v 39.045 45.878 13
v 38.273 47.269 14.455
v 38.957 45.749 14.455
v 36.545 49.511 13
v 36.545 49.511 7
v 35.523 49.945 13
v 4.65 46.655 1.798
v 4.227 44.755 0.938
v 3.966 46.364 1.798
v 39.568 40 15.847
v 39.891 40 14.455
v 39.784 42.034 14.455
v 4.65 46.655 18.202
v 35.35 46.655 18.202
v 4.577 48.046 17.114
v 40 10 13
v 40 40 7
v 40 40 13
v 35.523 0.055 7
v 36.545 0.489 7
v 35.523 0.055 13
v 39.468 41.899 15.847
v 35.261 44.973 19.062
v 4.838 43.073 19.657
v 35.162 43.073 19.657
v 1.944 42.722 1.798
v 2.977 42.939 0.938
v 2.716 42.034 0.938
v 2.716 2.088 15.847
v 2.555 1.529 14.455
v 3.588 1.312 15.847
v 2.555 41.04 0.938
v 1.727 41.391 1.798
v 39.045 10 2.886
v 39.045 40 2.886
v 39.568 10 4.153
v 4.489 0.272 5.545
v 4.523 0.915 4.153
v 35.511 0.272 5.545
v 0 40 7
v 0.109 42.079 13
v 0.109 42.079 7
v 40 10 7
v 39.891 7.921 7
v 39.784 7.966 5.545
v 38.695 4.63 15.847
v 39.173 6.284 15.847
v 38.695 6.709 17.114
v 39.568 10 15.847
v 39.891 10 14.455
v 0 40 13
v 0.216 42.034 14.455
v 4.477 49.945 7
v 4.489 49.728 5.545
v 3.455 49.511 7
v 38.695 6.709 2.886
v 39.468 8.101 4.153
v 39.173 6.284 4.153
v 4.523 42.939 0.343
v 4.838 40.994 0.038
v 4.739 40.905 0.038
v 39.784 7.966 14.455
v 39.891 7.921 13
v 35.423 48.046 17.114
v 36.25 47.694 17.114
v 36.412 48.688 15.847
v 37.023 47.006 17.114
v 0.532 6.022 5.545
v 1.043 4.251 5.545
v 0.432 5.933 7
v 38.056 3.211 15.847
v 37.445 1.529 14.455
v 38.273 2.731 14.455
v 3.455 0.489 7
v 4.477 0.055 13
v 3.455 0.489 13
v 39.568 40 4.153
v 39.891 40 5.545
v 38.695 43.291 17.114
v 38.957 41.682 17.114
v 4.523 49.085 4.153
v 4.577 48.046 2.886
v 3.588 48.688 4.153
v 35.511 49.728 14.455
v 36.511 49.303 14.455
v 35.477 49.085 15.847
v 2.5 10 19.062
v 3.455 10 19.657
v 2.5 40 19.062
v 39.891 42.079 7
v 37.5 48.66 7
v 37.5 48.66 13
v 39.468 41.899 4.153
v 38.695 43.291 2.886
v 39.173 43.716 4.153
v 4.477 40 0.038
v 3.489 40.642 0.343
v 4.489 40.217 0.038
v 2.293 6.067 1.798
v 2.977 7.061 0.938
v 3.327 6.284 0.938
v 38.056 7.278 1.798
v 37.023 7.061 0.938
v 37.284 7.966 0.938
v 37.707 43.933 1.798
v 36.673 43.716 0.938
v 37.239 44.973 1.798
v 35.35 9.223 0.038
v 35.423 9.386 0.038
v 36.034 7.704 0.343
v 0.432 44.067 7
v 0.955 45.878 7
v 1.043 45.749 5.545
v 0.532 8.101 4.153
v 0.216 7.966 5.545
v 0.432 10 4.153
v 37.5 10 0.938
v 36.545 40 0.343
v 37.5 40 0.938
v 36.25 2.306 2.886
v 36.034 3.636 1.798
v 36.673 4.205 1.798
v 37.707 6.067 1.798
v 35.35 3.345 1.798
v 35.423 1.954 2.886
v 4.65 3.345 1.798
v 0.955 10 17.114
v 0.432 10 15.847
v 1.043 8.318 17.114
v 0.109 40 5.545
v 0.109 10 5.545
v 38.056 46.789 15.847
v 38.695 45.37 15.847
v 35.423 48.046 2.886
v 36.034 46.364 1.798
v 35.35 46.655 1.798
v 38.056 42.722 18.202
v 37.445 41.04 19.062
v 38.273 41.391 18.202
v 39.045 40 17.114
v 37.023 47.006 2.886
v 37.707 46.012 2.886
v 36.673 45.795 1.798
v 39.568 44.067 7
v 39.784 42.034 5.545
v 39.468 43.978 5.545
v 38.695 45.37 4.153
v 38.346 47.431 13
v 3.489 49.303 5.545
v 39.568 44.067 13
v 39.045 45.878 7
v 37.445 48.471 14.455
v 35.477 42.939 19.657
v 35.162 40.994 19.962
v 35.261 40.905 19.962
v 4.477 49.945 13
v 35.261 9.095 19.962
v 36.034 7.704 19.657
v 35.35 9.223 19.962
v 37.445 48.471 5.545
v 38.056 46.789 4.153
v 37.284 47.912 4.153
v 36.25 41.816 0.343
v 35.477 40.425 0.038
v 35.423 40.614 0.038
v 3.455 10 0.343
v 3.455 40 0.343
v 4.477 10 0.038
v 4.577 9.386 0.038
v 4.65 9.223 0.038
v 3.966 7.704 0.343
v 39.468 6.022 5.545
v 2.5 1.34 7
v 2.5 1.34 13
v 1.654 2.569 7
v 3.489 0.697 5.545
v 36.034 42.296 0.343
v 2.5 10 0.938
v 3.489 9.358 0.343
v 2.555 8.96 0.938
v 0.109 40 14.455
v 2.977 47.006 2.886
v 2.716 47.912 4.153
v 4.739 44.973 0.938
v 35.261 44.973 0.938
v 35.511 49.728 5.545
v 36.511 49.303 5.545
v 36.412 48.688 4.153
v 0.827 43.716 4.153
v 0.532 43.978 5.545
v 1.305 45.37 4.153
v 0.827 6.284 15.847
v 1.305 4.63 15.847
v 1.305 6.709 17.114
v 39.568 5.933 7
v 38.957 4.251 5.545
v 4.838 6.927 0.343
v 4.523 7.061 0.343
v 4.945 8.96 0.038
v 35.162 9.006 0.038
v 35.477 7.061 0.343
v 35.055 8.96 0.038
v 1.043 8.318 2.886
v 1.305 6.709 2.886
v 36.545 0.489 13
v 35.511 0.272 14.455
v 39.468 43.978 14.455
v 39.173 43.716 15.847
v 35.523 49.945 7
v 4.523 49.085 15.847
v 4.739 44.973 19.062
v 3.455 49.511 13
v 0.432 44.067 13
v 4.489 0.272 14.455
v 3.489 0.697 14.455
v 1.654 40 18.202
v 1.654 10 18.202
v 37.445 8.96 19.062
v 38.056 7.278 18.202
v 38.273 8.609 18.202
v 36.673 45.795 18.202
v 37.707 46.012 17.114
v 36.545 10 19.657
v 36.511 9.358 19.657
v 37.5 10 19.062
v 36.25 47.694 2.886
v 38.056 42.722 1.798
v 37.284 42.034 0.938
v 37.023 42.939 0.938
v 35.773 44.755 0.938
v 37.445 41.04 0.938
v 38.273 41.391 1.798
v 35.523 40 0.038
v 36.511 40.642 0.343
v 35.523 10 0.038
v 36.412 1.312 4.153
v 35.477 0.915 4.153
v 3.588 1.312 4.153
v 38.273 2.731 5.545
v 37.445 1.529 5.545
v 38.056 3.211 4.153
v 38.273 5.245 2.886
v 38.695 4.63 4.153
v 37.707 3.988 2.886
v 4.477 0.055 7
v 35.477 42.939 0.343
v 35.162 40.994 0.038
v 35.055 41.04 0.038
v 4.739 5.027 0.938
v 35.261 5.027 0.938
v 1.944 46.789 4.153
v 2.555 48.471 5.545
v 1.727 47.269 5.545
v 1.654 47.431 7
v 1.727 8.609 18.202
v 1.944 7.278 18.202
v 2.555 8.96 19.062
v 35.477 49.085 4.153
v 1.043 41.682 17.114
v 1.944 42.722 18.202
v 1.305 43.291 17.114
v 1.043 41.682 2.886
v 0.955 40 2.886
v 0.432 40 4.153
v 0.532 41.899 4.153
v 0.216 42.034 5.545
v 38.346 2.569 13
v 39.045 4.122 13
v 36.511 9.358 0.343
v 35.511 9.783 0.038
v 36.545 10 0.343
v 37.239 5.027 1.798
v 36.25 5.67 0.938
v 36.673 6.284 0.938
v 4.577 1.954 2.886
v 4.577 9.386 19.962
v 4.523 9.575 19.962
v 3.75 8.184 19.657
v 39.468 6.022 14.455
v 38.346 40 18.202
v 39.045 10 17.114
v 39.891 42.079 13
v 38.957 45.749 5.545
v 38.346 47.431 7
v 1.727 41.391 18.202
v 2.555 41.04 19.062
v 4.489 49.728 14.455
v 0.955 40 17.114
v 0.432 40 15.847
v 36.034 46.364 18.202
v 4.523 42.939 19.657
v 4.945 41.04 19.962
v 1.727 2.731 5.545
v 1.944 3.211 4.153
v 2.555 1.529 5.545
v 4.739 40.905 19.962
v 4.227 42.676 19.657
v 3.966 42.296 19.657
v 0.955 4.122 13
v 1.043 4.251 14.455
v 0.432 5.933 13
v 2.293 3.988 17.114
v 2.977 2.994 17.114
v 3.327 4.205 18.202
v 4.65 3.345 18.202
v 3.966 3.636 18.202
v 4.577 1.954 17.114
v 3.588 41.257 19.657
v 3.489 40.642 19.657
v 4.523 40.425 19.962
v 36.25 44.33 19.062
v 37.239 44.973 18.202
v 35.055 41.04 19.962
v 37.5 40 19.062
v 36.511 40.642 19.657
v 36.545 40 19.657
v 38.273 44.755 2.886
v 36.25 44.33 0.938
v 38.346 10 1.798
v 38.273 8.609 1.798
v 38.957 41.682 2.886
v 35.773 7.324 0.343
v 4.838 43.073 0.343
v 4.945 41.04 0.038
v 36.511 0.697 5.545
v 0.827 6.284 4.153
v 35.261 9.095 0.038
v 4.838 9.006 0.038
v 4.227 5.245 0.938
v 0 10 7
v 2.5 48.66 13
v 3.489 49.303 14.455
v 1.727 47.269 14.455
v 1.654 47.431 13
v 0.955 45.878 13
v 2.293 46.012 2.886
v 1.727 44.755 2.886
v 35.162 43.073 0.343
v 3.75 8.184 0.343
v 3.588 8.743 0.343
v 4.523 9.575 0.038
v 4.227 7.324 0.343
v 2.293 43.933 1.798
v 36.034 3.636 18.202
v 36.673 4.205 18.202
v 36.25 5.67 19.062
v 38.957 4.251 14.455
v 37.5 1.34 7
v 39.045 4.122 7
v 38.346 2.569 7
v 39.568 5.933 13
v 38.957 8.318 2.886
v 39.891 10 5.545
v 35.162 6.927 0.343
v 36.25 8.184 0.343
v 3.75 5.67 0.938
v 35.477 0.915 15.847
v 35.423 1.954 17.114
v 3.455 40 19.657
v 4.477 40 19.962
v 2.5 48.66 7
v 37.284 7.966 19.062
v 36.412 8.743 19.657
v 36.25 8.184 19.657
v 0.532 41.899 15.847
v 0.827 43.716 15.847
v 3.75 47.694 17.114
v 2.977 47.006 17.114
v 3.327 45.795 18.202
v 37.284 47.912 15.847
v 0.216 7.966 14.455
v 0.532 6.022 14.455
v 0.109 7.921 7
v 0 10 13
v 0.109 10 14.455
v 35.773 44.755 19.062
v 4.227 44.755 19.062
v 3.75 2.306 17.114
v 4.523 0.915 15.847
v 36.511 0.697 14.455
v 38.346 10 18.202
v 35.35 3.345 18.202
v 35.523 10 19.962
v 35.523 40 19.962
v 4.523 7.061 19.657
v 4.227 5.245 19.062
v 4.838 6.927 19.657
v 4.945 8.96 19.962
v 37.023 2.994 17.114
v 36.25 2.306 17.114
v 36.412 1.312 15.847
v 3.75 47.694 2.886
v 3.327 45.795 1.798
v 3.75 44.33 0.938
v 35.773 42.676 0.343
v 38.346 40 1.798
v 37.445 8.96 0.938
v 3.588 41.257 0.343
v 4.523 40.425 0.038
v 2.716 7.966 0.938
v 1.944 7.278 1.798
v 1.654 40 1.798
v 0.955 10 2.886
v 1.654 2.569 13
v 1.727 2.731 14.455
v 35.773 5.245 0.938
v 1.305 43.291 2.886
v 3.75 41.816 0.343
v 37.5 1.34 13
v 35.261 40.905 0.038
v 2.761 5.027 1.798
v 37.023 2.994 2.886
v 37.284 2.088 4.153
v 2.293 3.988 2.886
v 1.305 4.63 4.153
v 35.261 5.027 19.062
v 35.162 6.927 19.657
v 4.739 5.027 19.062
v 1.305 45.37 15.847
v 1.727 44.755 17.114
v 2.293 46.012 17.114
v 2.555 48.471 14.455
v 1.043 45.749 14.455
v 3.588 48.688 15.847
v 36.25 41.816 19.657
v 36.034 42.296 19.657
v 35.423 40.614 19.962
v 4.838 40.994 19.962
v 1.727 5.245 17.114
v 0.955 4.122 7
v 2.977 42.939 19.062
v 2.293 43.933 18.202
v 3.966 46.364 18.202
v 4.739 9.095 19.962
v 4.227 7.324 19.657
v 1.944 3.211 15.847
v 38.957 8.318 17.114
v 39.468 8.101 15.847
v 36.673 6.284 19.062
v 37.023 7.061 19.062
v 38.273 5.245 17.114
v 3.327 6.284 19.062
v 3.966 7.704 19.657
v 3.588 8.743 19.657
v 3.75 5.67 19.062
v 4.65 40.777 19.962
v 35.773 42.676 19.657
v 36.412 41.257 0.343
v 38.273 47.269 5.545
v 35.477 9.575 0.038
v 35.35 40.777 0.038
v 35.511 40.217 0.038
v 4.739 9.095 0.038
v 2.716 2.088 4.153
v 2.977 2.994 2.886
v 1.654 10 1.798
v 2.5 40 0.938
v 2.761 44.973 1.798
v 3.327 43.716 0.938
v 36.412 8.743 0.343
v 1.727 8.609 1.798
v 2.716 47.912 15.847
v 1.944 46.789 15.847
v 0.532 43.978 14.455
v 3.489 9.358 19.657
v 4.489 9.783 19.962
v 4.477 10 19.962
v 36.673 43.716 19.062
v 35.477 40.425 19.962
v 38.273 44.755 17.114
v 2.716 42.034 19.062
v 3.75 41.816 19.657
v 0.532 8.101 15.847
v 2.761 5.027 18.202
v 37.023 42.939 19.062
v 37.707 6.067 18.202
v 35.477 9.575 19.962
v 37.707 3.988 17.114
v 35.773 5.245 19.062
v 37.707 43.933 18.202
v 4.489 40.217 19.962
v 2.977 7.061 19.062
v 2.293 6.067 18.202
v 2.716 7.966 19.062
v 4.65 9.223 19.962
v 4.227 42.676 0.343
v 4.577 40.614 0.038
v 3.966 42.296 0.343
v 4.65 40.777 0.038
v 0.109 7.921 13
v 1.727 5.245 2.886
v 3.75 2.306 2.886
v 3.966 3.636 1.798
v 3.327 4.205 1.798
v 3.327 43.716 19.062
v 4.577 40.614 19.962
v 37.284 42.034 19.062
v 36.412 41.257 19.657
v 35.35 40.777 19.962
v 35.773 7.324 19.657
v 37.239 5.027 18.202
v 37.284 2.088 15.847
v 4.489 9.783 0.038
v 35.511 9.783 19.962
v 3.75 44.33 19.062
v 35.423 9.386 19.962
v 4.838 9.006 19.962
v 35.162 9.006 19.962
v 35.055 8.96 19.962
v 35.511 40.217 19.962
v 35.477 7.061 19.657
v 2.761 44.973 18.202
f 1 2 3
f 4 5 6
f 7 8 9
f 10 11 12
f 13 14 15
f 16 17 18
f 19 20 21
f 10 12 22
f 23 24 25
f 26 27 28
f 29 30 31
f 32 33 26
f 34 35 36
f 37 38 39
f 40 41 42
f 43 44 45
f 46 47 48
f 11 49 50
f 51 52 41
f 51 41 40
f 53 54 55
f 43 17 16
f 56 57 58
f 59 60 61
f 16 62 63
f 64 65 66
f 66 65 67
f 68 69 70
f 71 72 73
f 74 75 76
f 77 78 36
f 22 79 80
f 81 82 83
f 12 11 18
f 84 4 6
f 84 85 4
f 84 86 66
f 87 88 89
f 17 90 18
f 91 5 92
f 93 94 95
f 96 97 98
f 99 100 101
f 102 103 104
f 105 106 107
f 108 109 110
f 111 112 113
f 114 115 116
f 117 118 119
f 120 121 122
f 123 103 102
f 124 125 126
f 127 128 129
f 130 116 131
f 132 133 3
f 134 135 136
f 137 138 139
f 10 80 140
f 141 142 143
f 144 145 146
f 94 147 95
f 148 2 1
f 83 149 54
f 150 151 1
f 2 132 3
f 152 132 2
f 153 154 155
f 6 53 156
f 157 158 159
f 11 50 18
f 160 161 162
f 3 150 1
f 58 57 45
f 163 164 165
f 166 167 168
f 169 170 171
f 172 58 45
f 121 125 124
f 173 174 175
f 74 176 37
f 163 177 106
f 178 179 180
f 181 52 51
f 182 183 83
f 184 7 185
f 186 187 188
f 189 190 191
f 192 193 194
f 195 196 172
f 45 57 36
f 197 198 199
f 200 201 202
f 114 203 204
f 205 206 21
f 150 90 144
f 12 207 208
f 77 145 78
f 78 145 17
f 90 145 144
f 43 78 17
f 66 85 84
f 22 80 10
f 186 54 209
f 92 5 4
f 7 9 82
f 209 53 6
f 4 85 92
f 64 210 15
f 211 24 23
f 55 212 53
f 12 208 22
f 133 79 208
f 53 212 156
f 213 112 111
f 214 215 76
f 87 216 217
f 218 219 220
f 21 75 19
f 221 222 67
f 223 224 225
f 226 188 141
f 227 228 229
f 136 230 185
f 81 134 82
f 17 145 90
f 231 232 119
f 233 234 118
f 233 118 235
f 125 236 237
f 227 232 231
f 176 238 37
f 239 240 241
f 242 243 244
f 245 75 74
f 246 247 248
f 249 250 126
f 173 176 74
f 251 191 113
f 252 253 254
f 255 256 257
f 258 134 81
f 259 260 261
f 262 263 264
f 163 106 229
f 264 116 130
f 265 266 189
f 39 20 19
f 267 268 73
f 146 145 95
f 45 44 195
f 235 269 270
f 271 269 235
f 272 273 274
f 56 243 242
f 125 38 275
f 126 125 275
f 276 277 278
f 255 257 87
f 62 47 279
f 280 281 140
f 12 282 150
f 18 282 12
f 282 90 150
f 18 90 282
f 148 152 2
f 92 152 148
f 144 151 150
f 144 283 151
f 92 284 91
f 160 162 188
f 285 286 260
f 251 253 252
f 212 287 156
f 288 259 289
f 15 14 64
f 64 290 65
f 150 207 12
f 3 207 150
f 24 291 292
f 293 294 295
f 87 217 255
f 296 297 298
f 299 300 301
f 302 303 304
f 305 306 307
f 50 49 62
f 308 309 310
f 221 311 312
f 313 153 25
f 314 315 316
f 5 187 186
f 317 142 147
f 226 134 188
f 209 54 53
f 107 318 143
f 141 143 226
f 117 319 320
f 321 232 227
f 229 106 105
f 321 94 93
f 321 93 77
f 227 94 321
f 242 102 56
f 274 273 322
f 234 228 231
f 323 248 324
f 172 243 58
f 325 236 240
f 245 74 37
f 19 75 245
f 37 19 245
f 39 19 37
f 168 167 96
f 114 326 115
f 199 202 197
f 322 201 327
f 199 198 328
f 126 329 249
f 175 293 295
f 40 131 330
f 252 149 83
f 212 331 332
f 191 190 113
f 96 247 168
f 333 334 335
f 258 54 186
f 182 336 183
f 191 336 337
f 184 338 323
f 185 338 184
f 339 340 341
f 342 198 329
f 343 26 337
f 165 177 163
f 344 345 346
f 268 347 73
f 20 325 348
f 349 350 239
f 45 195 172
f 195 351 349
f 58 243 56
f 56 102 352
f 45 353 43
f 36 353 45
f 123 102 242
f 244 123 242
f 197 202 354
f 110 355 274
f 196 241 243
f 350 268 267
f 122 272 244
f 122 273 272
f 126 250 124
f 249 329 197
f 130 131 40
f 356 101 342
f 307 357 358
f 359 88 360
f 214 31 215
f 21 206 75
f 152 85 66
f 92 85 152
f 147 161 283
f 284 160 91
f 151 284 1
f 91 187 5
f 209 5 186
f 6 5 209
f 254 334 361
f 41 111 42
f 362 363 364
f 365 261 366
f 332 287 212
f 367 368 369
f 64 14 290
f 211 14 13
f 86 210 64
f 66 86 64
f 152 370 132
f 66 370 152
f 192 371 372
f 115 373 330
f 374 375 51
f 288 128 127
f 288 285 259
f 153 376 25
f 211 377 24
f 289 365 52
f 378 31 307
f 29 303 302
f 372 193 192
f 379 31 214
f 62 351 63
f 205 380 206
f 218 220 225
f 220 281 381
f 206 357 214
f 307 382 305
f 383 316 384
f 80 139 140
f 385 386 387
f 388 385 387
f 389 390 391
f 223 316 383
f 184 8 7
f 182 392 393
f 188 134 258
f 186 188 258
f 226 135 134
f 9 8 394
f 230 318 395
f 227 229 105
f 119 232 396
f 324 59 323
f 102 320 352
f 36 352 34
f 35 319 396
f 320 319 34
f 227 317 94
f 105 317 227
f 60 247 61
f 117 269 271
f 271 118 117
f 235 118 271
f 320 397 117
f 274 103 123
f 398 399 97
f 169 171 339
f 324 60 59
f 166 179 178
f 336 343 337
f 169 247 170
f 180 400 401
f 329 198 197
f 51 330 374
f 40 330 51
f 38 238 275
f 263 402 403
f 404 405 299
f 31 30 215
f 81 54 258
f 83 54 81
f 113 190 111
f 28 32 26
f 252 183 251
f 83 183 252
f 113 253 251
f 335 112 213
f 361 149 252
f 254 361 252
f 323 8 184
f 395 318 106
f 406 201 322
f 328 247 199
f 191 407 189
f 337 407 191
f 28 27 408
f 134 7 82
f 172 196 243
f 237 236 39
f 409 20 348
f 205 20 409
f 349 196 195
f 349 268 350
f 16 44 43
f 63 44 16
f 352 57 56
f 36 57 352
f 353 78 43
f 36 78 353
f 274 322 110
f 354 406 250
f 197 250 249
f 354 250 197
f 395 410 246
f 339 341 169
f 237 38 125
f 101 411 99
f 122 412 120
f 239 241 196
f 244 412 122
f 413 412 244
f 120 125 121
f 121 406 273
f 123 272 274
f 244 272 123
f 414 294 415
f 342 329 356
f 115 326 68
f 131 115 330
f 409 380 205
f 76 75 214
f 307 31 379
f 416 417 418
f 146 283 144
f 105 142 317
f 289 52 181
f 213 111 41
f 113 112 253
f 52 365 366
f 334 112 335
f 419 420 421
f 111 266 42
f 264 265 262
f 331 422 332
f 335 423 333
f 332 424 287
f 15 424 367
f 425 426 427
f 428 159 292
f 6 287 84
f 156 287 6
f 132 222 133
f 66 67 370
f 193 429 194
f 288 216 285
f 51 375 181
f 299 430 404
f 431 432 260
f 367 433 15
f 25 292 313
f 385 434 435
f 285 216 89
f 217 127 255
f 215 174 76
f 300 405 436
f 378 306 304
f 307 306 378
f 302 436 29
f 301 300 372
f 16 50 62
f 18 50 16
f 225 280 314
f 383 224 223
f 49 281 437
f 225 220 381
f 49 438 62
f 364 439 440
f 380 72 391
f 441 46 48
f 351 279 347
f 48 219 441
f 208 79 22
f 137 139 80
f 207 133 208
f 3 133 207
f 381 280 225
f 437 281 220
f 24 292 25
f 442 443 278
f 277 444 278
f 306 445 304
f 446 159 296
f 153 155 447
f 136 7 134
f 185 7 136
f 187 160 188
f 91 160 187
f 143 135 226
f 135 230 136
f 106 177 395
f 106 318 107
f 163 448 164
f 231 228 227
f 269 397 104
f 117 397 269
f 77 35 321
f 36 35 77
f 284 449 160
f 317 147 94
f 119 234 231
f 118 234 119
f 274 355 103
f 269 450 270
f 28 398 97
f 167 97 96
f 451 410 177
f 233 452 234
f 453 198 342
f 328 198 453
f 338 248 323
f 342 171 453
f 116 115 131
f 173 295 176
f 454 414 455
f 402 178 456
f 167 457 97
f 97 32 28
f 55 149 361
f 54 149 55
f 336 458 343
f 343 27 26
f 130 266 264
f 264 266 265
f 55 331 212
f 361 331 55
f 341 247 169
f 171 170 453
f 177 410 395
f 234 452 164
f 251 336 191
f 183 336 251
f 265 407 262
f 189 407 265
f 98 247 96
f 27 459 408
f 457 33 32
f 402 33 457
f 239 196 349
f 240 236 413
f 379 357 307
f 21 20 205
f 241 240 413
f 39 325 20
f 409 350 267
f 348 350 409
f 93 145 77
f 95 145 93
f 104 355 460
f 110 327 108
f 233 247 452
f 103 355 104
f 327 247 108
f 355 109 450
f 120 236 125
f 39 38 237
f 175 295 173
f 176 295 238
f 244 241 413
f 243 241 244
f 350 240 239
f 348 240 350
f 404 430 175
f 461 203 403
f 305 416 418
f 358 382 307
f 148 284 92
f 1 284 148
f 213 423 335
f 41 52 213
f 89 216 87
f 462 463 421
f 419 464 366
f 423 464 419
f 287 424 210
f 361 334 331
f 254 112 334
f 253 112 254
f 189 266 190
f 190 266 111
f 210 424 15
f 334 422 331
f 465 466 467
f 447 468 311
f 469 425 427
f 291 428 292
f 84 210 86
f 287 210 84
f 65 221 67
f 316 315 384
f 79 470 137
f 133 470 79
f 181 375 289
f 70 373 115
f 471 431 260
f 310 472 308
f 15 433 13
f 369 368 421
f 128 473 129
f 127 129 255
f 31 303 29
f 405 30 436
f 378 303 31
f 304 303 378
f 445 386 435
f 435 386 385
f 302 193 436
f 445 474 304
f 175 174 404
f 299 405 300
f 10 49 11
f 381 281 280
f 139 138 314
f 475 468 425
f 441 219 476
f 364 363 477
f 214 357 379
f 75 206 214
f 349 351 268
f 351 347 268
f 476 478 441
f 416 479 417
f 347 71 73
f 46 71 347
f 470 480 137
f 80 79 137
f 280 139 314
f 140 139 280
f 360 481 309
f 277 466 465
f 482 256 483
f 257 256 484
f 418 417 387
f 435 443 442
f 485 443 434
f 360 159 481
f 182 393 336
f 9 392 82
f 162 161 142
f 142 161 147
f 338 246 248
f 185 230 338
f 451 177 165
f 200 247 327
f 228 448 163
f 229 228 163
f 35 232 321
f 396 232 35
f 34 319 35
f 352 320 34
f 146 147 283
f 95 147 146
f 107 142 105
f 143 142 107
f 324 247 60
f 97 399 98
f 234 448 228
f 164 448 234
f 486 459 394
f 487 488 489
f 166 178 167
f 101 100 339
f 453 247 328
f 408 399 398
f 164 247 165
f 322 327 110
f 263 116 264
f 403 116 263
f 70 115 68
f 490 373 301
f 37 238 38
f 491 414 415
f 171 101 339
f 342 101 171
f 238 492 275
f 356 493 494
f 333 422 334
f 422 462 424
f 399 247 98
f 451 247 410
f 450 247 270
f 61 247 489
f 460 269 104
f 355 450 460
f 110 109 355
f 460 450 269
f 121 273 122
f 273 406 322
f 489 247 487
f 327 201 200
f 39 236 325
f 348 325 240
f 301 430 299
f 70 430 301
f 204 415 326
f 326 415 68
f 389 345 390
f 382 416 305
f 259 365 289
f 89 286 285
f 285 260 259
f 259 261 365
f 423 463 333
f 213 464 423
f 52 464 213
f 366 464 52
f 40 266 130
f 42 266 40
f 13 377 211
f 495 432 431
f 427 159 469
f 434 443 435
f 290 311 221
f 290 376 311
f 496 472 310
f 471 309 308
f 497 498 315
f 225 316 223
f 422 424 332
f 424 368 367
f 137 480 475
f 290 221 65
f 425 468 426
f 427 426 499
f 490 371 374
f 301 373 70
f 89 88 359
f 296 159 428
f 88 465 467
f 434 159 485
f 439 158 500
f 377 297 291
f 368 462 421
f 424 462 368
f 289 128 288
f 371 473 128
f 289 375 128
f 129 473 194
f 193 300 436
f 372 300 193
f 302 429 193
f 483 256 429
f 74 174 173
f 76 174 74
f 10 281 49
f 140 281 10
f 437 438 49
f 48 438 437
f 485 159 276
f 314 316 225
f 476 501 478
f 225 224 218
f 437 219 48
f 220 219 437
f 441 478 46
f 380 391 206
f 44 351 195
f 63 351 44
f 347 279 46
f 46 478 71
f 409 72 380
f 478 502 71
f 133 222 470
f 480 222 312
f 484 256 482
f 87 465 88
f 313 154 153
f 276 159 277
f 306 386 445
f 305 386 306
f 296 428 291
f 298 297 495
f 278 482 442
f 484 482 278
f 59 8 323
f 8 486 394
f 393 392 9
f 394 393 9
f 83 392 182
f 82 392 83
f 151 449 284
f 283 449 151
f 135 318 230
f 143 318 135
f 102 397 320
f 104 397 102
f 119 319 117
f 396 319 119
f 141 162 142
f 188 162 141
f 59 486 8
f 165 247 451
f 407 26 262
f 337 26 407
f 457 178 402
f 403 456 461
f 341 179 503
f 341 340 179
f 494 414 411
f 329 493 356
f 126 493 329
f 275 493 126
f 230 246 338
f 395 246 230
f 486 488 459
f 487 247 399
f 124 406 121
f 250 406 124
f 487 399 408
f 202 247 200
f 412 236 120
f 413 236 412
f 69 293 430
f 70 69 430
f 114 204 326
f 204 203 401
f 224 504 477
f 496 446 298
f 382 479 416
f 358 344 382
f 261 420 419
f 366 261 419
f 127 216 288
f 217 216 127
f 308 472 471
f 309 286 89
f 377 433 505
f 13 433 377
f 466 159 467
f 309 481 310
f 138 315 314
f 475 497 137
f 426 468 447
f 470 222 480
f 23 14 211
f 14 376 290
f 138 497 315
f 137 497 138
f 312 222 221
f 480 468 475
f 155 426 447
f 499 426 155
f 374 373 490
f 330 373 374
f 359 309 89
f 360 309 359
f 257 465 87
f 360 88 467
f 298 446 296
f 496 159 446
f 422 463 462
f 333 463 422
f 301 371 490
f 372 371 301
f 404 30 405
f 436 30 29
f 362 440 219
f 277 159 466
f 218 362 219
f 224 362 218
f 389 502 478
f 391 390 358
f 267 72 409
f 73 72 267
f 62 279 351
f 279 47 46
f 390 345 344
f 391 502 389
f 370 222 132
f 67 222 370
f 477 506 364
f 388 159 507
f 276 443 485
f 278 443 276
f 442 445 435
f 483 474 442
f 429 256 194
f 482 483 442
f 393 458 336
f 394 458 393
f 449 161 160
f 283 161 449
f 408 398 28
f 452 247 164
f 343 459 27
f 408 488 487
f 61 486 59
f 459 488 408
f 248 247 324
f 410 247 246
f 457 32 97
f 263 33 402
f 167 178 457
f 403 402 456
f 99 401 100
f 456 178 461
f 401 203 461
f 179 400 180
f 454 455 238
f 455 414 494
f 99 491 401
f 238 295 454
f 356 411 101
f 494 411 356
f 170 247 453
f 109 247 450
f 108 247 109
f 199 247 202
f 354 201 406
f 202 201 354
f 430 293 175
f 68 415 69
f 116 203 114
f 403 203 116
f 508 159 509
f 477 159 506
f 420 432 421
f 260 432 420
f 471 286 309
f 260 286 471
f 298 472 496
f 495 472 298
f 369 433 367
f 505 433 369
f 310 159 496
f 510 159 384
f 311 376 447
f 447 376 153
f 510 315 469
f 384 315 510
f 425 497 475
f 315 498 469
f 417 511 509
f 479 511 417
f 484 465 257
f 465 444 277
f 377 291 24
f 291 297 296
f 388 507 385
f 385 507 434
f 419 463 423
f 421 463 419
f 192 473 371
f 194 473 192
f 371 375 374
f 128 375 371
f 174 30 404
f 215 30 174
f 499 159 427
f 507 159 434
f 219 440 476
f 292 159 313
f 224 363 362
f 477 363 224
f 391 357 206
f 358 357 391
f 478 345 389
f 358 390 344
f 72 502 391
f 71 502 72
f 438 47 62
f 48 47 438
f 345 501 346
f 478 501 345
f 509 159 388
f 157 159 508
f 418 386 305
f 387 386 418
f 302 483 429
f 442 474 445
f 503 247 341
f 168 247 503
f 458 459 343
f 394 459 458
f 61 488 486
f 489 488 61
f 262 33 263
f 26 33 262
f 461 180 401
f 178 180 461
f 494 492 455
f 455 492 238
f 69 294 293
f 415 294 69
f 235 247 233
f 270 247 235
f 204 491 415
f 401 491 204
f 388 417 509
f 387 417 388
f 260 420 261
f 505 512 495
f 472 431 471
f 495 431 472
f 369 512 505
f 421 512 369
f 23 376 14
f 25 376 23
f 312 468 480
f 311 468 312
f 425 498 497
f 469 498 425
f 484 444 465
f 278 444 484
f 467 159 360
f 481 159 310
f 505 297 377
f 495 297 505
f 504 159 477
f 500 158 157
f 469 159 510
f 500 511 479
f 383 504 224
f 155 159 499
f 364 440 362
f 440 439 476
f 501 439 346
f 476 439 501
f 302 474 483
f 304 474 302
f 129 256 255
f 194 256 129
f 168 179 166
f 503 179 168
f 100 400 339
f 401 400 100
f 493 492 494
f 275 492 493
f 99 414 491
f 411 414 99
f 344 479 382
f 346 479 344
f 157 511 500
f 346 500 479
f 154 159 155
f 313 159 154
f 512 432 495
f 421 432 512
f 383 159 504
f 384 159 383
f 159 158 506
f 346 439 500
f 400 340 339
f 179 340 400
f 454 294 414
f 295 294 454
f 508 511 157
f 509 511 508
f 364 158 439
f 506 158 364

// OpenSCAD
/*
 *  OpenSCAD utilities 
 *
 *  by Ph.Gregoire AKA Greg Ware <greg.ware@laposte.net>
 *  
 *  Includes:
 *   - shorter macro modules to get a cube or cylinder with translation and rotation
 *   -  Due to some display defects in OpenSCAD preview (F5), some can use a small epsilon 
 *      so as to cut protruding apertures in solids
 *   - useful modules to build rounded corner cubes, triangle (wedges), etc
 *
 * History
 * Date         Author      Description
 * 2017/??/??   Ph.Gregoire Initial version(s)
 * 2018/07/18   Ph.Gregoire Rework for X5S corners
 *
 *  This work is licensed under the 
 *  Creative Commons Attribution 3.0 Unported License.
 *  To view a copy of this license, visit
 *    http://creativecommons.org/licenses/by/3.0/ 
 *  or send a letter to 
 *    Creative Commons, PO Box 1866, Mountain View, CA 94042, USA.
*/

// Thickness of supports for apertures
$_SUPPORT_THK=0.2;

// Cylinders $fn default
$_FN_CYL=32;

// Epsilon
$_EPSILON=0.2;

/* Simple translation */
module tr(dx,dy=0,dz=0) {
    translate([dx,dy,dz]) children();
}

/* Translate and rotate children */
module trrot(tx,ty,tz,ax,ay=0,az=0) {
    translate([tx,ty,tz]) rotate([ax,ay,az]) children();
}

/* translated cube */
module trcube(tx,ty,tz,dx,dy,dz) {
    translate([tx,ty,tz]) cube([dx,dy,dz]);
}

/* translated cube with epsilons along Z */
module trcube_eps(tx,ty,tz,dx,dy,dz) {
    translate([tx,ty,tz-$_EPSILON]) cube([dx,dy,dz+2*$_EPSILON]);
}

/* translated cylinder */
module trcyl(tx,ty,tz,d,h,center=false,fn=$_FN_CYL) {
	translate([tx,ty,tz]) cylinder(d=d,h=h,center=center,$fn=fn);
}

/* translated cylinder with epsilon along height (Z) */
module trcyl_eps(tx,ty,tz,d,h,center=false,fn=$_FN_CYL) {
    translate([tx,ty,tz-$_EPSILON]) cylinder(d=d,h=h+2*$_EPSILON,center=center,$fn=fn);
}

module trrotcyl(tx,ty,tz,ax,ay,az,d,h,center=false,fn=$_FN_CYL) {
	trrot(tx,ty,tz,ax,ay,az) cylinder(d=d,h=h,center=center,$fn=fn);
}

/* translated and rotated cylinder with epsilon along height (Z) */
module trrotcyl_eps(tx,ty,tz,ax,ay,az,d,h,center=false,fn=$_FN_CYL) {
    trrot(tx,ty,tz,ax,ay,az) translate([0,0,-$_EPSILON]) cylinder(d=d,h=h+2*$_EPSILON,center=center,$fn=fn);
}

/* translated and rotated cube */
module trrotcube(tx,ty,tz,ax,ay,az,dx,dy,dz) {
    trrot(tx,ty,tz,ax,ay,az) cube([dx,dy,dz]);
}

/* Translated rotate cube with diff children (in cube referential) */
module trrotcube_diff(tx,ty,tz,ax,ay,az,dx,dy,dz) {
    trrot(tx,ty,tz,ax,ay,az) difference() {
        cube([dx,dy,dz]);
        children();
    }
}

/* Box with apertures cut out from children */
module boxWithApertures(w,l,h,t) {
    // Bottom
    trcube(-w/2-t,-l/2-t,0,w+2*t,l+2*t,t);

    // sides
    for(s=[0:3]) {
        L=w*((s+1)%2)+l*(s%2)+2*t;
        P=l*((s+1)%2)+w*(s%2);
        
        rotate([0,0,s*90]) {
            translate([-L/2,P/2,t]) {
                difference() {
                    cube([L,t,h]);
                    // aperture
                    if($children>s) {
                        translate([thk,thk,0]) rotate([90,0,0]) children(s);
                    }
                }
            }
        }
    }

}

/* Make a support: remove a thin support layer from a flat shape */
module supportDiff(thk) {
    difference() {
        children(0);
        translate([0,0,thk/2]) {
            linear_extrude(height=$_SUPPORT_THK) projection() children(0);
        }
    }
}

/* Lateral vents 
    n: number of vents
    h: height of vent and vent spacing
    l: horizontal length of vent
    x: horizontal x offset of vent
    z: vertical offset of first vent
    t: thickness of panel
*/
module vents(n,h,l,x,z,t) {
    for(v=[0:n-1]) {
        trcube_eps(x,z+2*v*h,0,l,h,t);
    }
}

/* Fan vent 
    w: width of panel
    dz: height of center of fan
    df: diameter of fan
    dh: diameter of hub
    fs: Number of fan spokes
    t: thickness of panel
*/
module fanvent(w,dz,df,dh,fs,t) {
    difference() {
        // External
        trcyl_eps(w/2,dz,0,df,t);
        
        // central hub
        trcyl_eps(w/2,dz,0,dh,t);
        
        // spokes
        translate([w/2,dz,0]) {
            for(a=[0:fs-1]) {
                rotate([0,0,180+a*(360/fs)]) trcube_eps(-t/2,0,0,t,df,t);
            }
        }
    }
}
/* Fan mounting holes
    w: Width of panel
    dz: height of center of fan
    wfh: width of fan holes
    dfh: diameter of fan holes
    t: thickness of panel
*/
module fanholes(w,dz,wfh,dfh,t) {
    for(x=[-1,1]) {
        for(y=[-1,1]) {
            trcyl_eps(w/2+wfh/2*x,dz+wfh/2*y,0,dfh,t);
        }
    }
}

/* Position children in one corner of box, using a centered box */
module cornerPos(w,l,h,x,y,center=true) {
    translate([center?x*w/2:(x+1)*w/2,center?y*l/2:(y+1)*l/2,h]) {
        if(x==-1 && y==-1) children();
        if(x==1 && y==-1) rotate([0,0,90]) children();
        if(x==1 && y==1) rotate([0,0,180]) children();
        if(x==-1 && y==1) rotate([0,0,270]) children();
    }
}

/* Position children at each 4 corners of centered cube */ 
module cornersPos(w,l,h,center=true) {
 for(x=[-1,1]) {
        for(y=[-1,1]) {
            cornerPos(w,l,h,x,y,center=center) children();
        }
    }
}


/* Quarter Cone */
module quarterCone(r1,r2,h) {
    intersection() {
        cylinder(r1=r2,r2=r1,h=h);
        cube([r1>r2?r1:r2,r1>r2?r1:r2,h]);
    }
}

module quarterCyl(r,h) {
    intersection() {
        cylinder(r=r,h=h,$fn=$_FN_CYL);
        cube([r,r,h]);
    }
}

/* Corner rounding */
module champfer(rounding,h) {
    difference() {
        translate([-$_EPSILON,-$_EPSILON,-$_EPSILON])
            cube([rounding+$_EPSILON,rounding+$_EPSILON,h+2*$_EPSILON]);
        translate([rounding,rounding])
            cylinder(r=rounding,h=h);
    }
}

/* Triangle by extrusion. the a parameter is the rotation angle */
module triangle(dx,dy,h,a=0) {
    if(a<0) triangle(dx,dy,h,a=a+360);
    else {
        a=a%360;
        linear_extrude(height=h) {
            if(a<90) polygon(points=[[0,0],[dx,0],[0,dy],[0,0]]);
            else if(a<180) polygon(points=[[0,0],[dx,dy],[dx,0],[0,0]]);
            else if(a<270) polygon(points=[[dx,dy],[0,dy],[dx,0],[dx,dy]]);
            else if(a<360) polygon(points=[[0,0],[dx,dy],[0,dy],[0,0]]);
        }
    }
}

module roundedFlatBox(dx,dy,h,r) {
    linear_extrude(height=h)
    offset(r=r)
    translate([r,r]) square([dx-2*r,dy-2*r]);
}

module roundedBoundingBox(dx,dy,dz,rx,ry,rz) {
    minkowski() {
        trcube(rx,ry,rz,dx-2*rx,dy-2*ry,dz-2*rz);
        r=max(rx,ry,rz);
        scale([rx/r,ry/r,rz/r]) sphere(r);
    }
}

test();

module test() {
    //triangle(30,20,10,270);
    //quarterCyl(5,10);
    //champfer(5,10);
    roundedBoundingBox(40,50,20,5,10,7);
}
